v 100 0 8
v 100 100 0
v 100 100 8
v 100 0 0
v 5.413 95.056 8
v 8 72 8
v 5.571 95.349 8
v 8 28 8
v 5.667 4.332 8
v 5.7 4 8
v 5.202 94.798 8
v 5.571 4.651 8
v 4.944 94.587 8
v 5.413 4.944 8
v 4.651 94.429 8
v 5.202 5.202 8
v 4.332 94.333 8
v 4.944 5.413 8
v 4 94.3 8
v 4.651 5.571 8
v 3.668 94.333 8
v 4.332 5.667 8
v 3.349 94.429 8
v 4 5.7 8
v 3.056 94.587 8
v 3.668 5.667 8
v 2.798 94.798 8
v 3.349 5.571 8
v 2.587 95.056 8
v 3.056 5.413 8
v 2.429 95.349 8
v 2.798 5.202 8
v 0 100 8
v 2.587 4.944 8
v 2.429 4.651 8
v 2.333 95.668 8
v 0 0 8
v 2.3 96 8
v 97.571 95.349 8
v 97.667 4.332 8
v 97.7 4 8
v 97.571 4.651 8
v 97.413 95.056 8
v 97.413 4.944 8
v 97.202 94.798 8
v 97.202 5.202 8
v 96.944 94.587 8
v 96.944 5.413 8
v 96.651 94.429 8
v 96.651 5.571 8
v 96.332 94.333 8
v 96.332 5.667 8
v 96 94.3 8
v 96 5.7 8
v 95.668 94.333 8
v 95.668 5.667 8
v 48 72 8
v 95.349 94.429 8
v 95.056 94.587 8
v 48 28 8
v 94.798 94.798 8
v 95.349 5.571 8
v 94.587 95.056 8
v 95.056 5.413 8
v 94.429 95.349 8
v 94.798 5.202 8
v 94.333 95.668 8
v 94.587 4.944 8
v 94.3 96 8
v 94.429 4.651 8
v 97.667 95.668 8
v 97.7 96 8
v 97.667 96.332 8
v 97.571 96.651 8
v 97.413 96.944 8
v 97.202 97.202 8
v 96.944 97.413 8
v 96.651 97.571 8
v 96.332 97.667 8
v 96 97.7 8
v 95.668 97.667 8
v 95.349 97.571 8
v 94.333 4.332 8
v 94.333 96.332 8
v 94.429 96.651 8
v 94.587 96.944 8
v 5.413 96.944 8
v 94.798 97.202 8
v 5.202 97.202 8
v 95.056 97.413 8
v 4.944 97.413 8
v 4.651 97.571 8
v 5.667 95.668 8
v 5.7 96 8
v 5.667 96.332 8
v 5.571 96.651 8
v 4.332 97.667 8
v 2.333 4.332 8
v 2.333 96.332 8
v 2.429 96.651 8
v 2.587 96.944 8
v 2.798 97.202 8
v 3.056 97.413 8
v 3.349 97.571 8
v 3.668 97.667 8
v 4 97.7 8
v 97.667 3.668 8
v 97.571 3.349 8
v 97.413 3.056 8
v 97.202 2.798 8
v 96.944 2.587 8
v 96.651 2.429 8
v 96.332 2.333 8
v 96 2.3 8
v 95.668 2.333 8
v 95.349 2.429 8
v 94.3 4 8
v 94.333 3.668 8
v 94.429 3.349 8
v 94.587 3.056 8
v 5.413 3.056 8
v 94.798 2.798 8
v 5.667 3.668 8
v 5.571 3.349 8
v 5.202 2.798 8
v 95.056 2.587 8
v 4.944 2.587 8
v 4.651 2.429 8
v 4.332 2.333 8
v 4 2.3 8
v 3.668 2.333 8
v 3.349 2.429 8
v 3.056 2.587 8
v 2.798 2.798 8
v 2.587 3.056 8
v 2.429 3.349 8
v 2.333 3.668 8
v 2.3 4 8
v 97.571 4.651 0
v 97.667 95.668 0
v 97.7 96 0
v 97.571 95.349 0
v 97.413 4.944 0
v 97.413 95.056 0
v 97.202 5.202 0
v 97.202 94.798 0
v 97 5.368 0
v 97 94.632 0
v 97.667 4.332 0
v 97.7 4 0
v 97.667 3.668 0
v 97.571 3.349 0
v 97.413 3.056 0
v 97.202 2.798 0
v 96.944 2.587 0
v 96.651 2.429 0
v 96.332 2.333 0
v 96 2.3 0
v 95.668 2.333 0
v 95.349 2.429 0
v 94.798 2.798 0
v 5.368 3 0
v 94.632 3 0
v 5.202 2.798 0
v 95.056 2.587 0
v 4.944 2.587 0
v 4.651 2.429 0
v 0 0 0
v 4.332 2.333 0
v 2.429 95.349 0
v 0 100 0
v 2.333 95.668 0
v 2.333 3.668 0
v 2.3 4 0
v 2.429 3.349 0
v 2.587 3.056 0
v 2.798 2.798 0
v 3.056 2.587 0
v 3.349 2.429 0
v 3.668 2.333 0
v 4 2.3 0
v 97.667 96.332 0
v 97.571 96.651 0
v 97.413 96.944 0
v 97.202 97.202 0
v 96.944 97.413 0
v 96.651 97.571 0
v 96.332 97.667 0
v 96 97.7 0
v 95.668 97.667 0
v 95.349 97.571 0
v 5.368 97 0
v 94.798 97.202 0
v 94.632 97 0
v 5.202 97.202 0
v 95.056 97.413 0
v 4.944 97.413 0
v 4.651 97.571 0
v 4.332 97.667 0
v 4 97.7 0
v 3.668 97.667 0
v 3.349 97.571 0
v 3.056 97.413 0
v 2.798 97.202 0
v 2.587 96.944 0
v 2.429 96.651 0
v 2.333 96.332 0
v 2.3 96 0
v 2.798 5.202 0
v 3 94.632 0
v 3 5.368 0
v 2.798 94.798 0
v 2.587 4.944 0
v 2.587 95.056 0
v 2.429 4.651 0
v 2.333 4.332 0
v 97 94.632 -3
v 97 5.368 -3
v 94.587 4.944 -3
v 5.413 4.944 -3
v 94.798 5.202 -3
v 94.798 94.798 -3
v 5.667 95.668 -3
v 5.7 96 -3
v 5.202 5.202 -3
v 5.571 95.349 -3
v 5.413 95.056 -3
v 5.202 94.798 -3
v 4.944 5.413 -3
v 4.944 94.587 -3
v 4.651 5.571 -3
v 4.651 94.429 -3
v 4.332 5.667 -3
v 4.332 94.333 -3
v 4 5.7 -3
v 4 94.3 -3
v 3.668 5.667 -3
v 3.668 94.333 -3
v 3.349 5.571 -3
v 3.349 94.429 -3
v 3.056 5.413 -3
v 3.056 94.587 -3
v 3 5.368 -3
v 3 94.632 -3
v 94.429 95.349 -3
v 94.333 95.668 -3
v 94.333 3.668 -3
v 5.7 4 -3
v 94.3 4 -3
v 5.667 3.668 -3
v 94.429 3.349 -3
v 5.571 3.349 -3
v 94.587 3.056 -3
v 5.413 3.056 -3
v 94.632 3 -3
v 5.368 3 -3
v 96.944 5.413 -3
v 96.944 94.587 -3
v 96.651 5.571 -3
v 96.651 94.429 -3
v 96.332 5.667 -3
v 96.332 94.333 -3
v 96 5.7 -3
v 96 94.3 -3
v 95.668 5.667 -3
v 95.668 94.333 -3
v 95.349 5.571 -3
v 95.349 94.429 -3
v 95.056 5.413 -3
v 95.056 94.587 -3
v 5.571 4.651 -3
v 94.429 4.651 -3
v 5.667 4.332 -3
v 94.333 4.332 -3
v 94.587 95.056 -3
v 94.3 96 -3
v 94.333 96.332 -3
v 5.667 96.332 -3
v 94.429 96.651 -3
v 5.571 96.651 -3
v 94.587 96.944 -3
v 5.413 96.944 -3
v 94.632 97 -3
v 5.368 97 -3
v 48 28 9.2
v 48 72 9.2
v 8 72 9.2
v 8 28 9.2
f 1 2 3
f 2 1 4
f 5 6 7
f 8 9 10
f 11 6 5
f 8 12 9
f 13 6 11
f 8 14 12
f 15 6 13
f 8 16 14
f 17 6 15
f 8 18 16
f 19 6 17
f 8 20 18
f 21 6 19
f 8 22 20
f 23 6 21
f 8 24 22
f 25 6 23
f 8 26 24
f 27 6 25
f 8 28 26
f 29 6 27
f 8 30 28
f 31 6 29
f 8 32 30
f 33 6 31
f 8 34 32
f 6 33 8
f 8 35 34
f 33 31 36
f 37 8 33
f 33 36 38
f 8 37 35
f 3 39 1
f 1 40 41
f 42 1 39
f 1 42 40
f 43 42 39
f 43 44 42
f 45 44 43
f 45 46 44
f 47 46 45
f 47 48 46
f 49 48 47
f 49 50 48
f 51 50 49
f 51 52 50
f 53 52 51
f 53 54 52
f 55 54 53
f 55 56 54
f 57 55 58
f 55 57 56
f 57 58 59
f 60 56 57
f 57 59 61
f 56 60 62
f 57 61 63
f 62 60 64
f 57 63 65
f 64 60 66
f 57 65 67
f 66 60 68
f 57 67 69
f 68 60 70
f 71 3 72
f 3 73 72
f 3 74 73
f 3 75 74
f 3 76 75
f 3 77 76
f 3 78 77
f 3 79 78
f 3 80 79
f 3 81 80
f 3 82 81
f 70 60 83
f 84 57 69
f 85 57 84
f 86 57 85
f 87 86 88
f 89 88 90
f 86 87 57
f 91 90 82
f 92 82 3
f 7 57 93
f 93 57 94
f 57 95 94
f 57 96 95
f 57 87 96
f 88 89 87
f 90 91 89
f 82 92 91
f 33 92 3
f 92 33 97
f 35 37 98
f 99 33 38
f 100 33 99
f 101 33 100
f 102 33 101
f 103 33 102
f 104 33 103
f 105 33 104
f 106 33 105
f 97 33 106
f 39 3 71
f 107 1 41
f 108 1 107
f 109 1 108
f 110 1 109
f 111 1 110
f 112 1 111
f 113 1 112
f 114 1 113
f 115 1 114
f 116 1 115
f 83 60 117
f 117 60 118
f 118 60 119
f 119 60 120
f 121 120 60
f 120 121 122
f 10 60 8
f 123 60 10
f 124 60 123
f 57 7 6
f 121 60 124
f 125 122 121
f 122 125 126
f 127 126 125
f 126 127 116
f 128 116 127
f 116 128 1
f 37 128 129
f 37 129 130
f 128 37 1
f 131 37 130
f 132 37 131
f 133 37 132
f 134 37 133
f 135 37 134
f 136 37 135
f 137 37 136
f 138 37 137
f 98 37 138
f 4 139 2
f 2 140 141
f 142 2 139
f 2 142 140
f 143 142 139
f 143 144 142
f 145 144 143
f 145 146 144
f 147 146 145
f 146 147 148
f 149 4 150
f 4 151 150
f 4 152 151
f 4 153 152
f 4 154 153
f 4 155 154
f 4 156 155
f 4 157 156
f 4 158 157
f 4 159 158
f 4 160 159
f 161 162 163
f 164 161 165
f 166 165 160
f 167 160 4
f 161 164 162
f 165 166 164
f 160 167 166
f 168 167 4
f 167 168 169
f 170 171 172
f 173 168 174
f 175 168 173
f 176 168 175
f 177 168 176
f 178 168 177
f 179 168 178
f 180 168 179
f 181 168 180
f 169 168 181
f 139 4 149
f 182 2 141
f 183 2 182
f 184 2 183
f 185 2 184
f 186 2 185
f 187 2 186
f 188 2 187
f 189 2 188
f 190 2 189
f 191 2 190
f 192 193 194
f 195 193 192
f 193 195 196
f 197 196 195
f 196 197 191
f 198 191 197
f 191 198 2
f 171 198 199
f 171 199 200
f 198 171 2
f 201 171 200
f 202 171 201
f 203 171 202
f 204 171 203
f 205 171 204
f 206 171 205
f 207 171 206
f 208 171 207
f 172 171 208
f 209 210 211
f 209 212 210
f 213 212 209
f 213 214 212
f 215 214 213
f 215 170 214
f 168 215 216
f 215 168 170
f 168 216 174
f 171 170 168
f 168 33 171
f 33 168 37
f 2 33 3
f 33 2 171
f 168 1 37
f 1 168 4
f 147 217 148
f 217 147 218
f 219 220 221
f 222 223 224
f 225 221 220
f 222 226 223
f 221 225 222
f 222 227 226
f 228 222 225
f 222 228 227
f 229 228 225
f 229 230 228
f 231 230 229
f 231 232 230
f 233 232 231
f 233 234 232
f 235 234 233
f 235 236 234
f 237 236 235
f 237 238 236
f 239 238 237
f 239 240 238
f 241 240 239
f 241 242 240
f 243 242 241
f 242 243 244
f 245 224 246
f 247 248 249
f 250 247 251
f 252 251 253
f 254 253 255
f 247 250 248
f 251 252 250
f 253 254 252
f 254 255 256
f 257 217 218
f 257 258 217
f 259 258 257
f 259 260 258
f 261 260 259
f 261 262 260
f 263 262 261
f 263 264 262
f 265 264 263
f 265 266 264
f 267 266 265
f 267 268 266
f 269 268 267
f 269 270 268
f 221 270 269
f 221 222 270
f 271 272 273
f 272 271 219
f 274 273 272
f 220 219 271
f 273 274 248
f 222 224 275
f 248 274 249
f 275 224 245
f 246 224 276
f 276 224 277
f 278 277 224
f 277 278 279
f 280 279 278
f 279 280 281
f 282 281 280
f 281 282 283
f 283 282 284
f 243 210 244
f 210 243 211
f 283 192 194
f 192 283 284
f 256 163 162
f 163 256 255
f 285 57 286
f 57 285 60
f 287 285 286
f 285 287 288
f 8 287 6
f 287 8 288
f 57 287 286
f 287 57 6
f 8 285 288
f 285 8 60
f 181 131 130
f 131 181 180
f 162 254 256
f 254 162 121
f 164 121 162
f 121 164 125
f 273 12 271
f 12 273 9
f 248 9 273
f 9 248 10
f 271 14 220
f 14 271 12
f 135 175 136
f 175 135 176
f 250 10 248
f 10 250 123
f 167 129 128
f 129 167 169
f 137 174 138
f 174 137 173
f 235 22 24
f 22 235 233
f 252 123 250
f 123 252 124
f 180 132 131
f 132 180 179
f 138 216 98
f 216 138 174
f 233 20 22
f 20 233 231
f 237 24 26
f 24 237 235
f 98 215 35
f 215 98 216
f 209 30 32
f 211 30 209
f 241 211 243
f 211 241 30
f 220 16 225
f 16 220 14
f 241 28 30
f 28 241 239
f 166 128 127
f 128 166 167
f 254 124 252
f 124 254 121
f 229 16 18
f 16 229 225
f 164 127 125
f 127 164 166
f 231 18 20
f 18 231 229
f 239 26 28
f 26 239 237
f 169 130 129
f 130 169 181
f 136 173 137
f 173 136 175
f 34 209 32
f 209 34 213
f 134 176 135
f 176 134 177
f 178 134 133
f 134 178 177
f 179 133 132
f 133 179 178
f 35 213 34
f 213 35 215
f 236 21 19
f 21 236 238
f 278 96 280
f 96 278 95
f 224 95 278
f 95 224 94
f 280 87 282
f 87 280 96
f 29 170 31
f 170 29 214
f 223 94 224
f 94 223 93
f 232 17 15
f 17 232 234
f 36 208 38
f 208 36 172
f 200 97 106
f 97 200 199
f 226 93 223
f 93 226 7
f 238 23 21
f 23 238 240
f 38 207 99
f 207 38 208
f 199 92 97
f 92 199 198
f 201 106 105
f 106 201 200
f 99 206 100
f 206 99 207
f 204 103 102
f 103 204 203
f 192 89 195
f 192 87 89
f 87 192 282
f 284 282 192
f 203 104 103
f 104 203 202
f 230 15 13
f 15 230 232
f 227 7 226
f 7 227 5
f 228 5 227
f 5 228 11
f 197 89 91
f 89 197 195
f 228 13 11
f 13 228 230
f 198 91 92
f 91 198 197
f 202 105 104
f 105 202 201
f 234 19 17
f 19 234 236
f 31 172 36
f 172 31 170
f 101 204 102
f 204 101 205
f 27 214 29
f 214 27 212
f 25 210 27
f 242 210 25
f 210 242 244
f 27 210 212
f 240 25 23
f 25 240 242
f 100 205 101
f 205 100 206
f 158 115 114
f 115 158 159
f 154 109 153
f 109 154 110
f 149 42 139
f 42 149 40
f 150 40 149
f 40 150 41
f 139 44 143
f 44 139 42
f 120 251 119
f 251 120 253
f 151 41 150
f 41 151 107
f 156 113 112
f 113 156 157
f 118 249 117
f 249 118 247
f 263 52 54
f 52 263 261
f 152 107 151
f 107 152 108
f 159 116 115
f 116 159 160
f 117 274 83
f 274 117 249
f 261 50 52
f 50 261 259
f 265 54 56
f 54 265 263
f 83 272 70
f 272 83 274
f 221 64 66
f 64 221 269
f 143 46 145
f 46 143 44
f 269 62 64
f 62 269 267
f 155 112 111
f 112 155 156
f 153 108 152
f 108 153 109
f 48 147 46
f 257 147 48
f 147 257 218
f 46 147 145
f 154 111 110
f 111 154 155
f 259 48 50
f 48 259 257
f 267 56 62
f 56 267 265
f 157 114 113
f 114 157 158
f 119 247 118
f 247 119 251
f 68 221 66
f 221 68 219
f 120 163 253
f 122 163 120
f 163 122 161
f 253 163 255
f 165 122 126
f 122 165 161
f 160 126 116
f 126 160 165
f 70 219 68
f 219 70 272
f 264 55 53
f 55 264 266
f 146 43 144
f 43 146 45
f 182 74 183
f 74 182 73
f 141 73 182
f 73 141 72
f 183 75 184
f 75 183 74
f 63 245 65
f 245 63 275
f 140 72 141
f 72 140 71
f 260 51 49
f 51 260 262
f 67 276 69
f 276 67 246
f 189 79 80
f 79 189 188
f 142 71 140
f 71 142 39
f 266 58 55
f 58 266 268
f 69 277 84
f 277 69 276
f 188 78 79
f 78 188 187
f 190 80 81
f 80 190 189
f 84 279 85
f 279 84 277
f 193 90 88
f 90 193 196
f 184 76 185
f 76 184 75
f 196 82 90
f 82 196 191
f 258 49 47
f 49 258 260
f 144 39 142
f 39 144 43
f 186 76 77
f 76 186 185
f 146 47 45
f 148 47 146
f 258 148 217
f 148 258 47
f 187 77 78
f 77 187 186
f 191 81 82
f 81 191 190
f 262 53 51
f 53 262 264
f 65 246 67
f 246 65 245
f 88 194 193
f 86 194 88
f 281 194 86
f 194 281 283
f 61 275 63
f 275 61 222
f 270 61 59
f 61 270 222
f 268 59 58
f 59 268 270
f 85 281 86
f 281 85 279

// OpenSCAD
$fn = 32;

// ----------------------------------------------------------------------
// Enclosure lid: 100 x 100 x 8 mm, 4 bolt holes
// ----------------------------------------------------------------------

// --- parameters (mm) ---
length = 100;             // lid length, X
width = 100;              // lid width, Y
plate_t = 8;              // lid plate thickness
bolt_d = 3.4;             // bolt clearance
boss_lip = 4;             // bolt hole inset from the corner
sink = 1;                 // overlap of the lip and ribs into the plate
lip_h = 4;                // lip height below the plate
lip_wall = 3;             // lip wall thickness
label_h = 1.2;            // raised marking pad

module plate() {
  cube([length, width, plate_t]);
  /* lip that drops into the housing opening, sunk into the plate */
  translate([lip_wall, lip_wall, -lip_h + sink]) cube([length - 2 * lip_wall, width - 2 * lip_wall, lip_h]);
  /* raised marking pad on top, sunk 1 mm into the plate */
  translate([length * 0.08, width * 0.28, plate_t - 1]) cube([length * 0.4, width * 0.44, label_h + 1]);
}

difference() {
  plate();
  /* bolt pattern matching the corner bosses */
  for (sx = [0, 1]) for (sy = [0, 1])
    translate([sx * (length - 2 * boss_lip) + boss_lip, sy * (width - 2 * boss_lip) + boss_lip, -lip_h - 1])
      cylinder(h = plate_t + lip_h + 2, d = bolt_d);
}
